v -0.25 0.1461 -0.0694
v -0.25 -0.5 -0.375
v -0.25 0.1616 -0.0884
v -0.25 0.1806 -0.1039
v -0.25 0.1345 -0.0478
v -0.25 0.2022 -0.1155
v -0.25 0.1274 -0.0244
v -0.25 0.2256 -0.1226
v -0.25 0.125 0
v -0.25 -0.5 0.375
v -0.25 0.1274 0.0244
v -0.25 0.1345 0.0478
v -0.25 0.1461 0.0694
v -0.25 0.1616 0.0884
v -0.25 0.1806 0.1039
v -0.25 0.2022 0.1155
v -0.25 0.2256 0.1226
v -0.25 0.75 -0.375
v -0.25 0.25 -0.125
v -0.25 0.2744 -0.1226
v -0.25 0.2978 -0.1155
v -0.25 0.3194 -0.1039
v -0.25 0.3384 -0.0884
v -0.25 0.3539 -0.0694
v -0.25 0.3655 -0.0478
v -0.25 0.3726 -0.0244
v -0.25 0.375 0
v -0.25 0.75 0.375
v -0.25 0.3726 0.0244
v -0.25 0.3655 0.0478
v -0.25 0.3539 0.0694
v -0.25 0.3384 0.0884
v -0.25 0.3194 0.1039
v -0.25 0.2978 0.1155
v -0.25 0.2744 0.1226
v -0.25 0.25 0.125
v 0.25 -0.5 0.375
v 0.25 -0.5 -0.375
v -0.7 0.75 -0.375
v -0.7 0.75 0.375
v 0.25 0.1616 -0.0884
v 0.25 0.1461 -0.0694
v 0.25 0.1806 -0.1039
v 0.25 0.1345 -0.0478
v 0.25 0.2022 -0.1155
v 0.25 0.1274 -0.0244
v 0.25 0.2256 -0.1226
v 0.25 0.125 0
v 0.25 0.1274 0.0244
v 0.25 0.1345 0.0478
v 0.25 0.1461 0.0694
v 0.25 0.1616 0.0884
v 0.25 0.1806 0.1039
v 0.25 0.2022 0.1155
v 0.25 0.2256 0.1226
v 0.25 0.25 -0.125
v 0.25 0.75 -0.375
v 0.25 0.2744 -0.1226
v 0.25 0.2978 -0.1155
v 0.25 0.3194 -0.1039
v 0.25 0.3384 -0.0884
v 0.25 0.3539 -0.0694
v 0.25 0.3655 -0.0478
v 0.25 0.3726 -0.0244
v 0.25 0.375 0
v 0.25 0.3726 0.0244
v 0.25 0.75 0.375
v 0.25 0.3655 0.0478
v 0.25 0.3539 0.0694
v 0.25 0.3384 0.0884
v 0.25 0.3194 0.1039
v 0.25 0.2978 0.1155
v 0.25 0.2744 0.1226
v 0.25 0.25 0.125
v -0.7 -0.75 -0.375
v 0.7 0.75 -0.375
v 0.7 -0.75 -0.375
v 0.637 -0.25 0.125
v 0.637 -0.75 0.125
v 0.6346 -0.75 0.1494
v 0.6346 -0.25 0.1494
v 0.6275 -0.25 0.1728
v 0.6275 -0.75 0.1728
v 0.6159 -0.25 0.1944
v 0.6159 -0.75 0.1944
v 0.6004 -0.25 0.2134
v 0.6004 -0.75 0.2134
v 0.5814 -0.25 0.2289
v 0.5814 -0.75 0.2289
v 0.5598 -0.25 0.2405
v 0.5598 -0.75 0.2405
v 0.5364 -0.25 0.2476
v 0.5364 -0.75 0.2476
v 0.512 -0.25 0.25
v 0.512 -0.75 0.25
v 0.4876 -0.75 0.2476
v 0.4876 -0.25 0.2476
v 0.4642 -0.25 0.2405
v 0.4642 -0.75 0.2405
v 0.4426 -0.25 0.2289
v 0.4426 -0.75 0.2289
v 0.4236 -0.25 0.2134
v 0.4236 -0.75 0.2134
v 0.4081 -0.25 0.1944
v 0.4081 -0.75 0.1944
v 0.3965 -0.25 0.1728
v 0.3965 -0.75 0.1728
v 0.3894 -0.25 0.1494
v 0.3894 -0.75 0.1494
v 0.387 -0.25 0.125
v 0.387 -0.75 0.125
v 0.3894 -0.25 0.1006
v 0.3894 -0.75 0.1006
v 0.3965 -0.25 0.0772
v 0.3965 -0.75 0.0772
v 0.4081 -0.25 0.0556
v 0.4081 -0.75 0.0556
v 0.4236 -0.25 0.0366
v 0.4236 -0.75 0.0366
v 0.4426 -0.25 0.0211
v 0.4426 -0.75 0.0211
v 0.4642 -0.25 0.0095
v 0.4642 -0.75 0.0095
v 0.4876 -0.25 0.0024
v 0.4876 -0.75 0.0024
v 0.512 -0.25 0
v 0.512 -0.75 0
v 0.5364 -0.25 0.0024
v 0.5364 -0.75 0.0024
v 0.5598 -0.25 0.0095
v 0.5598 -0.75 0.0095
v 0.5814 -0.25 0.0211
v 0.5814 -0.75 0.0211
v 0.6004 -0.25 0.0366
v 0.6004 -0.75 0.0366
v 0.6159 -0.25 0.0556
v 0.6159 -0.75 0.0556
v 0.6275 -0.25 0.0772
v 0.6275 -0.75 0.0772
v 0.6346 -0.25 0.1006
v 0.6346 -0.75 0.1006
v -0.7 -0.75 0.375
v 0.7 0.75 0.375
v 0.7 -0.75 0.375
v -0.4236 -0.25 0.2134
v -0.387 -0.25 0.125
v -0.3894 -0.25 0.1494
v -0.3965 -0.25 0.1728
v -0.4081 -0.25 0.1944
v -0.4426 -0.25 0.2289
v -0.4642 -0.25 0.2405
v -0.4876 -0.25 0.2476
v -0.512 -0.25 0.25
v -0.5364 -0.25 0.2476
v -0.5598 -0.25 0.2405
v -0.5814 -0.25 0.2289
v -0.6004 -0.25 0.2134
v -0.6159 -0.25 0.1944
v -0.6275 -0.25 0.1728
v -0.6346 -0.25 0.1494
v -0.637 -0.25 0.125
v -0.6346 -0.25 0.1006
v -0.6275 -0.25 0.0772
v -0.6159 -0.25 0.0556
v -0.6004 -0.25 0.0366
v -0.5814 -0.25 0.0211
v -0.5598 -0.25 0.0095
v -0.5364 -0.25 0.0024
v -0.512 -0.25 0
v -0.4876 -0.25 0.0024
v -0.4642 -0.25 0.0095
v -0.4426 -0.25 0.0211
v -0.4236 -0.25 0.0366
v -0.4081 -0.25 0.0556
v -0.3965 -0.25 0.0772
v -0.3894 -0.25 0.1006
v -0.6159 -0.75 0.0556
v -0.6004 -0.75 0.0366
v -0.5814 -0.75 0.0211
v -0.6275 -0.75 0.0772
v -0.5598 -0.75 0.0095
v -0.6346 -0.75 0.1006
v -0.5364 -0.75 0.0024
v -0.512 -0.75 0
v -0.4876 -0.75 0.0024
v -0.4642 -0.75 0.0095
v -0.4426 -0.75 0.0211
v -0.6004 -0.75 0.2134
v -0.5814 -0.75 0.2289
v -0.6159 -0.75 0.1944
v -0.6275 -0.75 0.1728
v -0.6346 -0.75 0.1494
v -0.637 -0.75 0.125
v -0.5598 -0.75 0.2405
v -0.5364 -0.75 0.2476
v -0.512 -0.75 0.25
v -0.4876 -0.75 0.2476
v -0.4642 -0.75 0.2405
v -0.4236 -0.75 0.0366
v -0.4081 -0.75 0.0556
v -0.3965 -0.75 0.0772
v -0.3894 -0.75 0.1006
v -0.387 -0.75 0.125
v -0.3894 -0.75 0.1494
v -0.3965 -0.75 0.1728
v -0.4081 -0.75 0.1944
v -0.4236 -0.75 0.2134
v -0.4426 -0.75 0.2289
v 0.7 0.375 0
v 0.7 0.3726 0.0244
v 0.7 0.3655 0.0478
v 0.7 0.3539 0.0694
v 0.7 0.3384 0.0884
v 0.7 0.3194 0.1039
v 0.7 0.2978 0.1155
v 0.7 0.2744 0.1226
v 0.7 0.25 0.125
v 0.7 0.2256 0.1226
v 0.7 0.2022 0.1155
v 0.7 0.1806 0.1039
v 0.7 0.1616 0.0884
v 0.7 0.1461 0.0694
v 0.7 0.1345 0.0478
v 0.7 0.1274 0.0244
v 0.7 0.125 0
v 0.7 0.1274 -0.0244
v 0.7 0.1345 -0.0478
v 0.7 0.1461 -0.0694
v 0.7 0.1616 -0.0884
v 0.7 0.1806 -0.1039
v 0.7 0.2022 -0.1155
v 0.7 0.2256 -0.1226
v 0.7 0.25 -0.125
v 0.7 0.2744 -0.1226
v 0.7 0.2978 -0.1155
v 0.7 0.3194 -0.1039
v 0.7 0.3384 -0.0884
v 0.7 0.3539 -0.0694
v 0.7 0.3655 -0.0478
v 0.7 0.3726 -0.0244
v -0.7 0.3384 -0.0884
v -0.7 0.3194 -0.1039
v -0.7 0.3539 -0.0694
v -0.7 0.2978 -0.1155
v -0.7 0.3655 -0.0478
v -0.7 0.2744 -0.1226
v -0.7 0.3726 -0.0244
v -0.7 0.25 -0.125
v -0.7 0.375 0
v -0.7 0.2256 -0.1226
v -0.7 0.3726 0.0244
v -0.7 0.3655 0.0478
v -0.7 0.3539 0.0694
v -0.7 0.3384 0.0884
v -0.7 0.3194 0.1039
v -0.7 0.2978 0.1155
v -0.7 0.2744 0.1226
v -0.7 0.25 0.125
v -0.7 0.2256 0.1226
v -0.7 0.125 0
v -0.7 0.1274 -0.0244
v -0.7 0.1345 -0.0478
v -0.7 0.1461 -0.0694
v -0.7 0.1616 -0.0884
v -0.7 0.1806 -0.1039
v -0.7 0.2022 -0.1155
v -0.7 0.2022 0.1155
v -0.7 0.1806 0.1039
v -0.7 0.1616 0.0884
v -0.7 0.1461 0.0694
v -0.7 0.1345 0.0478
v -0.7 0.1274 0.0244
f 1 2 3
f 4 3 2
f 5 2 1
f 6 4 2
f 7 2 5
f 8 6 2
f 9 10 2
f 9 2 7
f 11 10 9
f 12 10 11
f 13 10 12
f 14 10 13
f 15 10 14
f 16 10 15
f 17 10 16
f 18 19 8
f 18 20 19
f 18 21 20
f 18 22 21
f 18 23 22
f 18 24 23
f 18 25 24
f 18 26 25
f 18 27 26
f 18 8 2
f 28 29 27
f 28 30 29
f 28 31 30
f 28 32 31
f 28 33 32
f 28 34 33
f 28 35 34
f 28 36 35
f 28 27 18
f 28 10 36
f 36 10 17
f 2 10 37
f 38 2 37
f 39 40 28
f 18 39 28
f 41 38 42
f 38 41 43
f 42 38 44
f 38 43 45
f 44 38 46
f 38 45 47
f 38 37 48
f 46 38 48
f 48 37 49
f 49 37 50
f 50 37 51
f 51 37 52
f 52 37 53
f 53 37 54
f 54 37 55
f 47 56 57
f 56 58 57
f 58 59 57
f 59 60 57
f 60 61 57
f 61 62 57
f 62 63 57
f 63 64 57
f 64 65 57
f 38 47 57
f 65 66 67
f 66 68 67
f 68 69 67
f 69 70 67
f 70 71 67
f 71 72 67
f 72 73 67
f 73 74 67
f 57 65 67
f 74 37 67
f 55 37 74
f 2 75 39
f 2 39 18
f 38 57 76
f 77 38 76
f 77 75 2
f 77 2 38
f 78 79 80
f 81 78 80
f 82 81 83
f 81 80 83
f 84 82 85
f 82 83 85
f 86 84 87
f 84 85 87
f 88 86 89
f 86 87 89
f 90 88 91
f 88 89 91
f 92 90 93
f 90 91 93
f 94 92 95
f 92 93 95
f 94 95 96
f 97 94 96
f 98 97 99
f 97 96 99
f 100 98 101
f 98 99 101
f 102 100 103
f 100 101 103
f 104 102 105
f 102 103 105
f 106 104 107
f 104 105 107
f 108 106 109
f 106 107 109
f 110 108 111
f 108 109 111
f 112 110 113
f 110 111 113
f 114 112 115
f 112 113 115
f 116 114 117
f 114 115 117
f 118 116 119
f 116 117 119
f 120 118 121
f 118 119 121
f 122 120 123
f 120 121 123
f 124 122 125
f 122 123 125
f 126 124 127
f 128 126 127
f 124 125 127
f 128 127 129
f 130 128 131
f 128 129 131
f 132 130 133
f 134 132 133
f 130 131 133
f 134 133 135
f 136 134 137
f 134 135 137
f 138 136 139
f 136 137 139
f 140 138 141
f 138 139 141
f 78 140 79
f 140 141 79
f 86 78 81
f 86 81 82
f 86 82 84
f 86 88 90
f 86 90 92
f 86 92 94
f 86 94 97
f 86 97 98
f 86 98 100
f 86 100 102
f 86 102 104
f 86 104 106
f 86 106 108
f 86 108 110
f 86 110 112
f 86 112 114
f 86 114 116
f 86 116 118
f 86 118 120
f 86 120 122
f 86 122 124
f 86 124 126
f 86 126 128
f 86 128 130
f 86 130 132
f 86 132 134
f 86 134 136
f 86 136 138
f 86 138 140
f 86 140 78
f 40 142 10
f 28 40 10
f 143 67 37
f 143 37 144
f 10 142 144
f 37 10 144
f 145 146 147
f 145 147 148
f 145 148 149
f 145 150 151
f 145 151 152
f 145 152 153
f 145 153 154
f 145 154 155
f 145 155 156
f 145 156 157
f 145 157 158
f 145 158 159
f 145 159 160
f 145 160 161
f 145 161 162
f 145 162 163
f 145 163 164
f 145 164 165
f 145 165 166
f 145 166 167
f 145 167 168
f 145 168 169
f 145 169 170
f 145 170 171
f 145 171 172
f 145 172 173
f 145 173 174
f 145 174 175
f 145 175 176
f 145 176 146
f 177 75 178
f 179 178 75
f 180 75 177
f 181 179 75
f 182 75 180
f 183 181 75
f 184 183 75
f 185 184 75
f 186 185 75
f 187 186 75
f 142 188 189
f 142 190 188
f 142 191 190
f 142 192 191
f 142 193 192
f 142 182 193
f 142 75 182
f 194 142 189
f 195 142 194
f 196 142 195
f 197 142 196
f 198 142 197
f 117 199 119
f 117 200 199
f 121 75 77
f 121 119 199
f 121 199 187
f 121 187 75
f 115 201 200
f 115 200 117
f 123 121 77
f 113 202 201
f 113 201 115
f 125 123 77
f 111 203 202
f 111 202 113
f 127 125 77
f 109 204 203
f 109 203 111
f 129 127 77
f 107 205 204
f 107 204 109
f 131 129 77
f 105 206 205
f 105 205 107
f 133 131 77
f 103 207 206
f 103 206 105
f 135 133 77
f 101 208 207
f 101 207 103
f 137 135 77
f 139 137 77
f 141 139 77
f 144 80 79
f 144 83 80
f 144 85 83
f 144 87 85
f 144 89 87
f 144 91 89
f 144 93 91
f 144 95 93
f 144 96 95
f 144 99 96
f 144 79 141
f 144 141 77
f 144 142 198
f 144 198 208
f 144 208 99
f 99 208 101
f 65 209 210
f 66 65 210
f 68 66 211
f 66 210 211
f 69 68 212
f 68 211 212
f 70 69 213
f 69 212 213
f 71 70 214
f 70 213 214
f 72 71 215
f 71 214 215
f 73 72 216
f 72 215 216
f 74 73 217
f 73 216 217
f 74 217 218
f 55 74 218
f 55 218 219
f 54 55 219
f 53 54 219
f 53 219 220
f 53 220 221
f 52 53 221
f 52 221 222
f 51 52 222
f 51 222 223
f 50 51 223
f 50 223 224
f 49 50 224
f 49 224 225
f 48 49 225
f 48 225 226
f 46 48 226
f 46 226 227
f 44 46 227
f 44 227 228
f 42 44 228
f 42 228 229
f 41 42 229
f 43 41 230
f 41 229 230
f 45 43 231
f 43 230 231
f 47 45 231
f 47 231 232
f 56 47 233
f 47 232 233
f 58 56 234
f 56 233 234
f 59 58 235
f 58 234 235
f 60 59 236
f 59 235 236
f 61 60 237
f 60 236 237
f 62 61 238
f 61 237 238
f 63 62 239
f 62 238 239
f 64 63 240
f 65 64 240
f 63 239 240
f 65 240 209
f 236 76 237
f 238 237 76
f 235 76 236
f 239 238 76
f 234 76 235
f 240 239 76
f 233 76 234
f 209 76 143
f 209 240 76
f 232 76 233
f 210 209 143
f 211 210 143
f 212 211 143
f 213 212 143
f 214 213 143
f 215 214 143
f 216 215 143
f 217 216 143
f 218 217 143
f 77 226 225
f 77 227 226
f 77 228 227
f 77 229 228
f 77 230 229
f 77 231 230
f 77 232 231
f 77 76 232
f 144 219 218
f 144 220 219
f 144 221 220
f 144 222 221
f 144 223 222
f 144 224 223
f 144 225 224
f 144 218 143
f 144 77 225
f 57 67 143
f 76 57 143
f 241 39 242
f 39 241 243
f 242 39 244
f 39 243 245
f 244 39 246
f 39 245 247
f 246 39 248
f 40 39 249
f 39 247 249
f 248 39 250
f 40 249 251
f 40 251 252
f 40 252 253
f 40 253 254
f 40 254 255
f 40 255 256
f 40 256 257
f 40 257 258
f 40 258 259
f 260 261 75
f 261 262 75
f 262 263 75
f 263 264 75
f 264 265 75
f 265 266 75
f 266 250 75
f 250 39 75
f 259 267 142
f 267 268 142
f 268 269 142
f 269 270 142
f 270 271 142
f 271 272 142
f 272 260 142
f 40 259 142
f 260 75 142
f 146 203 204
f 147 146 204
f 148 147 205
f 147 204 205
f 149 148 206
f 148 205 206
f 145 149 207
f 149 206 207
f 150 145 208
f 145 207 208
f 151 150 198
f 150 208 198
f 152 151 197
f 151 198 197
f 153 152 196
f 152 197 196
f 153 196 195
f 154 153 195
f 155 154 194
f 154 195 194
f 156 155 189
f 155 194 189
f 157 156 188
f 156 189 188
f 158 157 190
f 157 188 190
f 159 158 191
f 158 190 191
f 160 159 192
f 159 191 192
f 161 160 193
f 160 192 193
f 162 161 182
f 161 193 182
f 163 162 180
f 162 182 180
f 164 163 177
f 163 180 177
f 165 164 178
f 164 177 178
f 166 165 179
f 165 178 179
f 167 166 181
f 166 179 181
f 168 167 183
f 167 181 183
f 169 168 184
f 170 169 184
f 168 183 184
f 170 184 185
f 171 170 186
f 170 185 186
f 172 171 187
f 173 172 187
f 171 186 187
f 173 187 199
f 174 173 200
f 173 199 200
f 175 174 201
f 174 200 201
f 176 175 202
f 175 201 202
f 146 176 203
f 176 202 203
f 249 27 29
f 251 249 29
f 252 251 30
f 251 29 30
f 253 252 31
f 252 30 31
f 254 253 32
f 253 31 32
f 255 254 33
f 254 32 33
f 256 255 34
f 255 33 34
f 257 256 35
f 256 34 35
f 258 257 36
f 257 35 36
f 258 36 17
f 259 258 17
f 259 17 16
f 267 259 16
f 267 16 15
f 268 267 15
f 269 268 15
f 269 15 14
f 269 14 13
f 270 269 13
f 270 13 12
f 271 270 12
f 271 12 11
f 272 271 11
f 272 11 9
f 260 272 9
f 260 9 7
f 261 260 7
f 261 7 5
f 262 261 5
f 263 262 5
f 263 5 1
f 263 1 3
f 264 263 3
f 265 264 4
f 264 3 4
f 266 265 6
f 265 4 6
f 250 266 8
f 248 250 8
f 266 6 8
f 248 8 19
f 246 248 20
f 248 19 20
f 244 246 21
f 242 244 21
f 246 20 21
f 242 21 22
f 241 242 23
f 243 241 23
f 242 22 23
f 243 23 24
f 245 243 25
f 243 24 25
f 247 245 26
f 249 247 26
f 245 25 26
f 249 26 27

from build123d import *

# Parameters (mm, degrees)
F0_W     = 1.4
F0_H     = 0.75
F1_DEPTH = 0.75
F2_R     = 0.125
F3_DEPTH = 25
F4_W     = 0.5
F4_H     = 1.25
F5_DEPTH = 12.5
F6_R     = 0.125
F7_DEPTH = 0.5


with BuildPart() as f1:
    # F0 (on Front) → F1 (new body, symmetric)
    with BuildSketch(Plane.XZ):
        Rectangle(F0_W, F0_H)
    extrude(amount=F1_DEPTH, both=True)

    # F2 (on face) → F3 (cut)
    with BuildSketch(Plane.YZ.offset(0.7)):
        with Locations((0.25, 0)):
            Circle(F2_R)
    extrude(amount=-F3_DEPTH, mode=Mode.SUBTRACT)

    # F4 (on face) → F5 (cut, symmetric)
    with BuildSketch(Plane.XY.offset(0.375)):
        with Locations((0, 0.125)):
            Rectangle(F4_W, F4_H)
    extrude(amount=F5_DEPTH, both=True, mode=Mode.SUBTRACT)

    # F6 (on face) → F7 (cut)
    with BuildSketch(Plane.XZ.offset(0.75)):
        with Locations((0.512, 0.125)):
            Circle(F6_R)
        with Locations((-0.512, 0.125)):
            Circle(F6_R)
    extrude(amount=-F7_DEPTH, mode=Mode.SUBTRACT)


solid = f1.part
